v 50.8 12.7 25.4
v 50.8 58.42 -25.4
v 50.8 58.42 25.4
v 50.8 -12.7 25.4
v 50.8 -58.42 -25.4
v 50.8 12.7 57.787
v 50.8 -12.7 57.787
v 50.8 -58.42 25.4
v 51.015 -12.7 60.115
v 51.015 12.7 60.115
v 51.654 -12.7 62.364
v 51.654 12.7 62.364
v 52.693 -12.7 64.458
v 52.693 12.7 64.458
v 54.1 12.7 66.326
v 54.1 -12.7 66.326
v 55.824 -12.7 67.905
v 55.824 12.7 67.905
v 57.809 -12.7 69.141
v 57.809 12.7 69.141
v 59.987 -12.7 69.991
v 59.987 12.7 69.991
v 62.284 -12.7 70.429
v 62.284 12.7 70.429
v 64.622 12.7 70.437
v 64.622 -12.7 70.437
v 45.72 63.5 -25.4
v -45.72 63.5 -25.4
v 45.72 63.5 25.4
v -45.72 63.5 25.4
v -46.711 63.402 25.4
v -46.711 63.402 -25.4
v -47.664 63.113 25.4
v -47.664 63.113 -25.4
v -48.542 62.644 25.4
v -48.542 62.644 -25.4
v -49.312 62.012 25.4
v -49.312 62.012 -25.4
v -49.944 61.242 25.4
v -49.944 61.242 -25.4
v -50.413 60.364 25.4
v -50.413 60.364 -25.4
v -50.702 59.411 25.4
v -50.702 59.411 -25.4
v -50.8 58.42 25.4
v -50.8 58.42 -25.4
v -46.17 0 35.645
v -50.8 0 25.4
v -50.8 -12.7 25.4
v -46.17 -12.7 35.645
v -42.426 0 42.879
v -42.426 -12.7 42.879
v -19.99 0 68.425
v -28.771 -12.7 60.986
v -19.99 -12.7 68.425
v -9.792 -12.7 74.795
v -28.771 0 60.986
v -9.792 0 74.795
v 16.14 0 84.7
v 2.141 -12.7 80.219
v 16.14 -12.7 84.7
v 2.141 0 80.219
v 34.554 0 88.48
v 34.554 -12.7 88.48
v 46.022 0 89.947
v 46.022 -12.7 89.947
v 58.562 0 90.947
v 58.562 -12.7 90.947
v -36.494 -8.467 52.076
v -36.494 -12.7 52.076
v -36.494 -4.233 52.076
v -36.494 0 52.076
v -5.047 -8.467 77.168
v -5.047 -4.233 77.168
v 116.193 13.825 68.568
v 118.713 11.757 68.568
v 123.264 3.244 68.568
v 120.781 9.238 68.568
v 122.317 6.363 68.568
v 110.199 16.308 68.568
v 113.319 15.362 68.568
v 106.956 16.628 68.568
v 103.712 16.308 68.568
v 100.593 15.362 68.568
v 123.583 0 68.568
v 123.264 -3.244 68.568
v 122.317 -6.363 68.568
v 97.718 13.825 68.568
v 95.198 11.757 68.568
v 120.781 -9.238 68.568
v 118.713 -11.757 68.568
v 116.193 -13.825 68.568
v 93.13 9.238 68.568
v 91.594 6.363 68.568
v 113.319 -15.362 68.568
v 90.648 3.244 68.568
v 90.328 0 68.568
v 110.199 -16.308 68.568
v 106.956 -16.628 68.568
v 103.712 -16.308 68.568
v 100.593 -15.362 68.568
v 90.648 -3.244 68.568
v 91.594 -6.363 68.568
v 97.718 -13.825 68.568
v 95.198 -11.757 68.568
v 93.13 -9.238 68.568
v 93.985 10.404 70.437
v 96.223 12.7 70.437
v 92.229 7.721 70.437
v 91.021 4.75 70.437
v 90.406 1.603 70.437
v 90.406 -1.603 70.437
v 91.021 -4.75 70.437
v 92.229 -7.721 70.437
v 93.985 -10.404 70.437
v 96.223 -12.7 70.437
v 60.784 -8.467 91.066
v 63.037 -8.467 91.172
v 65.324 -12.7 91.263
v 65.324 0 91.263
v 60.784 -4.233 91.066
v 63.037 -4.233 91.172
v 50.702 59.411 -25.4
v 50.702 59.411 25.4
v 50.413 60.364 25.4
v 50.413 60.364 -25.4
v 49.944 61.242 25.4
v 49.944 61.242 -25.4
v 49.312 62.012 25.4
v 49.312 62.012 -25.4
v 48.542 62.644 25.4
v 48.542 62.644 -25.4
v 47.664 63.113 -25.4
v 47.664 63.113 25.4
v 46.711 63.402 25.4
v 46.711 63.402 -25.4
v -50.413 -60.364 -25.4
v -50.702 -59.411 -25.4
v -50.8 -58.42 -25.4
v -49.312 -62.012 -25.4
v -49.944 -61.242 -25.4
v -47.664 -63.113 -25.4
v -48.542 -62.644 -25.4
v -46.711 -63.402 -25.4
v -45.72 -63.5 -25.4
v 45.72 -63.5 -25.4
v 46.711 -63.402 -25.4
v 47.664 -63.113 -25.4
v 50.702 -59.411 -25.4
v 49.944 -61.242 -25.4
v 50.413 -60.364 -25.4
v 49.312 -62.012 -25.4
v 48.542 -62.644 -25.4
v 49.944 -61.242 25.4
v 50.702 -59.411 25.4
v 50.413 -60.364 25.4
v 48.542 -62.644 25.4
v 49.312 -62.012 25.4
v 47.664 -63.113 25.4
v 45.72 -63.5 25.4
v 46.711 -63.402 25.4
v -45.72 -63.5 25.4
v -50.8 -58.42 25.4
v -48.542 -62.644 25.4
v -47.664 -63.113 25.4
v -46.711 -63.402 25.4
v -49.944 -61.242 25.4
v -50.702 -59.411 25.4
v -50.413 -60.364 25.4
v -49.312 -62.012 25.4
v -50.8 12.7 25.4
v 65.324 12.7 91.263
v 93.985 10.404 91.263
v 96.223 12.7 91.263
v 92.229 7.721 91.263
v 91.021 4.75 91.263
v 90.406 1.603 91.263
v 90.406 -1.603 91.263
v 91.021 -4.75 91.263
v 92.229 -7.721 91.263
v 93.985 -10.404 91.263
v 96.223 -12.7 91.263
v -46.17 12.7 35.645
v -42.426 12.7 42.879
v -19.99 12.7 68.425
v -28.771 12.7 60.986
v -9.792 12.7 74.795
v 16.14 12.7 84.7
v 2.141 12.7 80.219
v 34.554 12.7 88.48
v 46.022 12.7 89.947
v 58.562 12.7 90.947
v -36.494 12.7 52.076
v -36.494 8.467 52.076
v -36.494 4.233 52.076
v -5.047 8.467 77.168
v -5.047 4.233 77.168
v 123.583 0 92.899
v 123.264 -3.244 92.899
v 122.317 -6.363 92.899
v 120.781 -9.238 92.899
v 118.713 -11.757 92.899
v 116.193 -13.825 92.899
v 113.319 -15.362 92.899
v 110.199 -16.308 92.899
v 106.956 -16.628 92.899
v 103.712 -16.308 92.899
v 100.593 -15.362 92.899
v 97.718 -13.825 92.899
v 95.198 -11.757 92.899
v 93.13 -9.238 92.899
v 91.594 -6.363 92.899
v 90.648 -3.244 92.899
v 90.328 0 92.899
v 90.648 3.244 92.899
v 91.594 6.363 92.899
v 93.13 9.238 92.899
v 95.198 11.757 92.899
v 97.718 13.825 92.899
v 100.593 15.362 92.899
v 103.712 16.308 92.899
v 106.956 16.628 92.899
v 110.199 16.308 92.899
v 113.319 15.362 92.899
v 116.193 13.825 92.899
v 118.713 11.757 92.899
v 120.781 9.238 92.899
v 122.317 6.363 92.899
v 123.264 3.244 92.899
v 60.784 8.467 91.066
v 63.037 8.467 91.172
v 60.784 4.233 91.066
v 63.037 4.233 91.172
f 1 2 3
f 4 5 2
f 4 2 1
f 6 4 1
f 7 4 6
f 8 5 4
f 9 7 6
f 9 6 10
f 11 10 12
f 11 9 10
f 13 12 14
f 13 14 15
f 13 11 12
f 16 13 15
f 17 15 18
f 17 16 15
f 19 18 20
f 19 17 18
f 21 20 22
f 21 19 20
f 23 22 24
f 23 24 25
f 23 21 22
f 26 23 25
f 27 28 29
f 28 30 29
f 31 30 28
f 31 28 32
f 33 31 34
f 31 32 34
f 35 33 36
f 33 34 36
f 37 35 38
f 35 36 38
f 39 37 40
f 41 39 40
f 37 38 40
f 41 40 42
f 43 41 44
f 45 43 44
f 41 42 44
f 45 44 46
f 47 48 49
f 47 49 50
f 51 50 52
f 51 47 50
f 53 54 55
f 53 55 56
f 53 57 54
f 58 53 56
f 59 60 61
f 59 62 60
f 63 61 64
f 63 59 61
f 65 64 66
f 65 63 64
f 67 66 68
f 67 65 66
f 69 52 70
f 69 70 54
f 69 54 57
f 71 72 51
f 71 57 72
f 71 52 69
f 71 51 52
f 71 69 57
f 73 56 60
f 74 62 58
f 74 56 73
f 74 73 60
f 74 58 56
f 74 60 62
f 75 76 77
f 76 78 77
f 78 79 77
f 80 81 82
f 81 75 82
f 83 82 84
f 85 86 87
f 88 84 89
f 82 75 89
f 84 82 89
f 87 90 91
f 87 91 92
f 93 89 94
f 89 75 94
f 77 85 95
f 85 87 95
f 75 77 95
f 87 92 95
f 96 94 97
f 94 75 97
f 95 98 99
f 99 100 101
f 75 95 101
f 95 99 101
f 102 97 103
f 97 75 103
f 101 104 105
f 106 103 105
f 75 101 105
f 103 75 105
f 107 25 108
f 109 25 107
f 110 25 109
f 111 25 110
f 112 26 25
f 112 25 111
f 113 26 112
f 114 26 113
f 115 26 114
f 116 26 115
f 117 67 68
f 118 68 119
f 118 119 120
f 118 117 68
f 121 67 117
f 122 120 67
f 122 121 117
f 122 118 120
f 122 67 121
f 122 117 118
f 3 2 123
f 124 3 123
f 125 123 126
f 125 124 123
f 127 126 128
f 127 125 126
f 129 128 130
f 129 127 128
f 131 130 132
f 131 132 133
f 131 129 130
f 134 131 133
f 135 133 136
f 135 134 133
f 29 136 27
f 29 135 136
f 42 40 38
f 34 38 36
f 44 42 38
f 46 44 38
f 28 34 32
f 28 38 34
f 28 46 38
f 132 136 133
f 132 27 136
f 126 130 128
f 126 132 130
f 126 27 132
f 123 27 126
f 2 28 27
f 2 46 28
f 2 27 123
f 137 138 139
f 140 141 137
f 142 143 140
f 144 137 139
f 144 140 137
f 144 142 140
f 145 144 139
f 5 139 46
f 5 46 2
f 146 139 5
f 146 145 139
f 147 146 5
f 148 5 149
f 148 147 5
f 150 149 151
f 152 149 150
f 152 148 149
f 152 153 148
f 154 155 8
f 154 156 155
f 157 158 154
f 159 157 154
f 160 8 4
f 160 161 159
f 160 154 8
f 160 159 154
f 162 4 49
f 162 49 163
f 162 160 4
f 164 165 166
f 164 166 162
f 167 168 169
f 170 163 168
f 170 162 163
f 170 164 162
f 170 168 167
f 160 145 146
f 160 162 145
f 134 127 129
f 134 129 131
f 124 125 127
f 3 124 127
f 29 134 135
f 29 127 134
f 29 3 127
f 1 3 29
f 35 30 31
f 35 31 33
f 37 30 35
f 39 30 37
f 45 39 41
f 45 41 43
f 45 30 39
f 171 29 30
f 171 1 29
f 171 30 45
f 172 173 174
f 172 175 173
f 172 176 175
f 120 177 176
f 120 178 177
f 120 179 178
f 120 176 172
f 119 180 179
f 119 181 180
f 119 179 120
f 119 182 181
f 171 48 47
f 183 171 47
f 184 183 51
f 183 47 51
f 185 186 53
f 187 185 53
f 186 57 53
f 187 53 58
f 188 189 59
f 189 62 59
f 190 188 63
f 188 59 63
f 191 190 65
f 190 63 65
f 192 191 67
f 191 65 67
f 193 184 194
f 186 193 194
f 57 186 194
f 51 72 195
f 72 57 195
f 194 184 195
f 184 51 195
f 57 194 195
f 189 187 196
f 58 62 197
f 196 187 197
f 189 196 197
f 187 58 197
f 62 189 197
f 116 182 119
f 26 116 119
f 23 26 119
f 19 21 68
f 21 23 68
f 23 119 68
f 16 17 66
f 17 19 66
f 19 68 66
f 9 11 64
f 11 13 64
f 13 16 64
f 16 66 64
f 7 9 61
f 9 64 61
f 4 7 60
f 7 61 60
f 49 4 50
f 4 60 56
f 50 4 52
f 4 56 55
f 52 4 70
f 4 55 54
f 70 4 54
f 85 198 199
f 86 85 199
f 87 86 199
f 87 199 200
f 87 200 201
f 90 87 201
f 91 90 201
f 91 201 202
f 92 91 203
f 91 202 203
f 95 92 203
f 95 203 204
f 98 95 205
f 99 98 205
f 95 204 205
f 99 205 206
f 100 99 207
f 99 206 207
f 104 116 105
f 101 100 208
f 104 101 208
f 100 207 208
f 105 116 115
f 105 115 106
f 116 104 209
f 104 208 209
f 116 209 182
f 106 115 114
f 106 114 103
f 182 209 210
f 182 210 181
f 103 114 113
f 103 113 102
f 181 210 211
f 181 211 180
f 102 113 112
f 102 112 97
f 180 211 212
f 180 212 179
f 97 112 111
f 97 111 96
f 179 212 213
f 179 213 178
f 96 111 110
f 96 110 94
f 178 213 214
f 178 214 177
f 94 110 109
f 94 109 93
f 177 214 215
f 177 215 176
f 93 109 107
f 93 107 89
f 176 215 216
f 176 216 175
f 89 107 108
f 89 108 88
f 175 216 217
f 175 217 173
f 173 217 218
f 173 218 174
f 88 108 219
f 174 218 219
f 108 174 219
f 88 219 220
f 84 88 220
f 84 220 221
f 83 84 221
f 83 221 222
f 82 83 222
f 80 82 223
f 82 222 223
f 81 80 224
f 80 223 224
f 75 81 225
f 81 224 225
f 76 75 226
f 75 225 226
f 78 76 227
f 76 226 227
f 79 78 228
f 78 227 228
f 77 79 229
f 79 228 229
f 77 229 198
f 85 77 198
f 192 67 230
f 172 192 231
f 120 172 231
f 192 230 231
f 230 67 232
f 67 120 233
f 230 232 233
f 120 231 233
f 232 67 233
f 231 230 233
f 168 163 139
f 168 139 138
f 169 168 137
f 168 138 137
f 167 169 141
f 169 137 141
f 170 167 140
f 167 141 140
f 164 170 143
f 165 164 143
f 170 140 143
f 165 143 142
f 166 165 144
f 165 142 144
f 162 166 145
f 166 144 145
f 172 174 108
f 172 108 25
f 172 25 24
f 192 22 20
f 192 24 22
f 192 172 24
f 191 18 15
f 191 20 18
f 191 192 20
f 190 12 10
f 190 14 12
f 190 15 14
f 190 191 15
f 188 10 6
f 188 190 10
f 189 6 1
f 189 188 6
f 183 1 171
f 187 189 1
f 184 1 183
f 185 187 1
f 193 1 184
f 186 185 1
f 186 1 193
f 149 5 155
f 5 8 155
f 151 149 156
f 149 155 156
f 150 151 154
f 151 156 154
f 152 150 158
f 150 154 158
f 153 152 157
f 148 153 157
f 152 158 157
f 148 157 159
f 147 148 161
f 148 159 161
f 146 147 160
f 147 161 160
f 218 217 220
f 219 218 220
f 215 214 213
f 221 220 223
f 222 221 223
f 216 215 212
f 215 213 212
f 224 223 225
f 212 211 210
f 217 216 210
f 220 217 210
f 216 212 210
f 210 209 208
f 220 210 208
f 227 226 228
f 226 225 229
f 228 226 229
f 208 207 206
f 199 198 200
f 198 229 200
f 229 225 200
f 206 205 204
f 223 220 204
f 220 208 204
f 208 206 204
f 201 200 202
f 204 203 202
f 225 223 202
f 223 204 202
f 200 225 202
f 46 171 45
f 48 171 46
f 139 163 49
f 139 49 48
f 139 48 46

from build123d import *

# Parameters (mm, degrees)
F1_DEPTH = 63.5
F0_W     = 17.5679588894
F0_H     = 20.8251091272
F2_DEPTH = 12.7
F4_R     = 5.08
F5_R     = 5.08


with BuildPart() as f1:
    # F0 (on Front) → F1 (new body, symmetric)
    with BuildSketch(Plane.XZ):
        Polygon((-50.8, 25.4), (-50.8, -25.4), (50.8, -25.4), (50.8, 25.4), (29.9748908728, 25.4), align=None)
    extrude(amount=F1_DEPTH, both=True)

    # F0 (on Front) → F2 (join, symmetric)
    with BuildSketch(Plane.XZ):
        with BuildLine():
            add(Edge.make_bspline(
                [(-50.8, 25.4), (-40.0576822889, 49.6242242179), (-26.1354784037, 86.069146105), (58.5620329332, 90.9465027441)],
                knots=[0, 0, 0, 0, 130.1130965779, 130.1130965779, 130.1130965779, 130.1130965779], degree=3))
            Line((-50.8, 25.4), (29.9748908728, 25.4))
            Line((29.9748908728, 25.4), (29.9748908728, 57.7870482366))
            ThreePointArc((29.9748908728, 57.7870482366), (38.1082806139, 79.6775376922), (58.5620329332, 90.9465027441))
        make_face()
        with BuildLine():
            Line((29.9748908728, 25.4), (50.8, 25.4))
            Line((50.8, 25.4), (50.8, 57.7870482366))
            ThreePointArc((50.8, 57.7870482366), (54.9254885829, 67.1554928224), (64.6216935366, 70.4374159629))
            Line((64.6216935366, 70.4374159629), (89.3876225336, 70.4374159629))
            Line((89.3876225336, 70.4374159629), (89.3876225336, 91.2625250901))
            Line((89.3876225336, 91.2625250901), (65.3235655796, 91.2625250901))
            add(Edge.make_bspline(
                [(58.5620329332, 90.9465027441), (60.7674907461, 91.0735053459), (63.0209371473, 91.1791038317), (65.3235655796, 91.2625250901)],
                knots=[130.1130965779, 130.1130965779, 130.1130965779, 130.1130965779, 133.5011411718, 133.5011411718, 133.5011411718, 133.5011411718], degree=3))
            ThreePointArc((58.5620329332, 90.9465027441), (38.1082806139, 79.6775376922), (29.9748908728, 57.7870482366))
            Line((29.9748908728, 57.7870482366), (29.9748908728, 25.4))
        make_face()
        with Locations((98.1716019783, 80.8499705265)):
            Rectangle(F0_W, F0_H)
    extrude(amount=F2_DEPTH, both=True)

    # F0 (on Front) → F3 (revolve)
    with BuildSketch(Plane.XZ):
        Polygon((106.955581423, 92.8989347667), (106.955581423, 91.2625250901), (106.955581423, 70.4374159629), (106.955581423, 68.5675365603), (123.5830926897, 68.5675365603), (123.5830926897, 92.8989347667), align=None)
    revolve(axis=Axis((106.955581423, 0, 80.7332356635), (0, 0, -1)))

    # F4
    f4_edges = [f1.edges().sort_by_distance(p)[0] for p in [
        (50.8, -63.5, 0),
        (-50.8, -63.5, 0),
        (50.8, 63.5, 0),
    ]]
    fillet(f4_edges, radius=F4_R)

    # F5
    f5_edges = [f1.edges().sort_by_distance(p)[0] for p in [
        (-50.8, 63.5, 0),
    ]]
    fillet(f5_edges, radius=F5_R)


solid = f1.part
